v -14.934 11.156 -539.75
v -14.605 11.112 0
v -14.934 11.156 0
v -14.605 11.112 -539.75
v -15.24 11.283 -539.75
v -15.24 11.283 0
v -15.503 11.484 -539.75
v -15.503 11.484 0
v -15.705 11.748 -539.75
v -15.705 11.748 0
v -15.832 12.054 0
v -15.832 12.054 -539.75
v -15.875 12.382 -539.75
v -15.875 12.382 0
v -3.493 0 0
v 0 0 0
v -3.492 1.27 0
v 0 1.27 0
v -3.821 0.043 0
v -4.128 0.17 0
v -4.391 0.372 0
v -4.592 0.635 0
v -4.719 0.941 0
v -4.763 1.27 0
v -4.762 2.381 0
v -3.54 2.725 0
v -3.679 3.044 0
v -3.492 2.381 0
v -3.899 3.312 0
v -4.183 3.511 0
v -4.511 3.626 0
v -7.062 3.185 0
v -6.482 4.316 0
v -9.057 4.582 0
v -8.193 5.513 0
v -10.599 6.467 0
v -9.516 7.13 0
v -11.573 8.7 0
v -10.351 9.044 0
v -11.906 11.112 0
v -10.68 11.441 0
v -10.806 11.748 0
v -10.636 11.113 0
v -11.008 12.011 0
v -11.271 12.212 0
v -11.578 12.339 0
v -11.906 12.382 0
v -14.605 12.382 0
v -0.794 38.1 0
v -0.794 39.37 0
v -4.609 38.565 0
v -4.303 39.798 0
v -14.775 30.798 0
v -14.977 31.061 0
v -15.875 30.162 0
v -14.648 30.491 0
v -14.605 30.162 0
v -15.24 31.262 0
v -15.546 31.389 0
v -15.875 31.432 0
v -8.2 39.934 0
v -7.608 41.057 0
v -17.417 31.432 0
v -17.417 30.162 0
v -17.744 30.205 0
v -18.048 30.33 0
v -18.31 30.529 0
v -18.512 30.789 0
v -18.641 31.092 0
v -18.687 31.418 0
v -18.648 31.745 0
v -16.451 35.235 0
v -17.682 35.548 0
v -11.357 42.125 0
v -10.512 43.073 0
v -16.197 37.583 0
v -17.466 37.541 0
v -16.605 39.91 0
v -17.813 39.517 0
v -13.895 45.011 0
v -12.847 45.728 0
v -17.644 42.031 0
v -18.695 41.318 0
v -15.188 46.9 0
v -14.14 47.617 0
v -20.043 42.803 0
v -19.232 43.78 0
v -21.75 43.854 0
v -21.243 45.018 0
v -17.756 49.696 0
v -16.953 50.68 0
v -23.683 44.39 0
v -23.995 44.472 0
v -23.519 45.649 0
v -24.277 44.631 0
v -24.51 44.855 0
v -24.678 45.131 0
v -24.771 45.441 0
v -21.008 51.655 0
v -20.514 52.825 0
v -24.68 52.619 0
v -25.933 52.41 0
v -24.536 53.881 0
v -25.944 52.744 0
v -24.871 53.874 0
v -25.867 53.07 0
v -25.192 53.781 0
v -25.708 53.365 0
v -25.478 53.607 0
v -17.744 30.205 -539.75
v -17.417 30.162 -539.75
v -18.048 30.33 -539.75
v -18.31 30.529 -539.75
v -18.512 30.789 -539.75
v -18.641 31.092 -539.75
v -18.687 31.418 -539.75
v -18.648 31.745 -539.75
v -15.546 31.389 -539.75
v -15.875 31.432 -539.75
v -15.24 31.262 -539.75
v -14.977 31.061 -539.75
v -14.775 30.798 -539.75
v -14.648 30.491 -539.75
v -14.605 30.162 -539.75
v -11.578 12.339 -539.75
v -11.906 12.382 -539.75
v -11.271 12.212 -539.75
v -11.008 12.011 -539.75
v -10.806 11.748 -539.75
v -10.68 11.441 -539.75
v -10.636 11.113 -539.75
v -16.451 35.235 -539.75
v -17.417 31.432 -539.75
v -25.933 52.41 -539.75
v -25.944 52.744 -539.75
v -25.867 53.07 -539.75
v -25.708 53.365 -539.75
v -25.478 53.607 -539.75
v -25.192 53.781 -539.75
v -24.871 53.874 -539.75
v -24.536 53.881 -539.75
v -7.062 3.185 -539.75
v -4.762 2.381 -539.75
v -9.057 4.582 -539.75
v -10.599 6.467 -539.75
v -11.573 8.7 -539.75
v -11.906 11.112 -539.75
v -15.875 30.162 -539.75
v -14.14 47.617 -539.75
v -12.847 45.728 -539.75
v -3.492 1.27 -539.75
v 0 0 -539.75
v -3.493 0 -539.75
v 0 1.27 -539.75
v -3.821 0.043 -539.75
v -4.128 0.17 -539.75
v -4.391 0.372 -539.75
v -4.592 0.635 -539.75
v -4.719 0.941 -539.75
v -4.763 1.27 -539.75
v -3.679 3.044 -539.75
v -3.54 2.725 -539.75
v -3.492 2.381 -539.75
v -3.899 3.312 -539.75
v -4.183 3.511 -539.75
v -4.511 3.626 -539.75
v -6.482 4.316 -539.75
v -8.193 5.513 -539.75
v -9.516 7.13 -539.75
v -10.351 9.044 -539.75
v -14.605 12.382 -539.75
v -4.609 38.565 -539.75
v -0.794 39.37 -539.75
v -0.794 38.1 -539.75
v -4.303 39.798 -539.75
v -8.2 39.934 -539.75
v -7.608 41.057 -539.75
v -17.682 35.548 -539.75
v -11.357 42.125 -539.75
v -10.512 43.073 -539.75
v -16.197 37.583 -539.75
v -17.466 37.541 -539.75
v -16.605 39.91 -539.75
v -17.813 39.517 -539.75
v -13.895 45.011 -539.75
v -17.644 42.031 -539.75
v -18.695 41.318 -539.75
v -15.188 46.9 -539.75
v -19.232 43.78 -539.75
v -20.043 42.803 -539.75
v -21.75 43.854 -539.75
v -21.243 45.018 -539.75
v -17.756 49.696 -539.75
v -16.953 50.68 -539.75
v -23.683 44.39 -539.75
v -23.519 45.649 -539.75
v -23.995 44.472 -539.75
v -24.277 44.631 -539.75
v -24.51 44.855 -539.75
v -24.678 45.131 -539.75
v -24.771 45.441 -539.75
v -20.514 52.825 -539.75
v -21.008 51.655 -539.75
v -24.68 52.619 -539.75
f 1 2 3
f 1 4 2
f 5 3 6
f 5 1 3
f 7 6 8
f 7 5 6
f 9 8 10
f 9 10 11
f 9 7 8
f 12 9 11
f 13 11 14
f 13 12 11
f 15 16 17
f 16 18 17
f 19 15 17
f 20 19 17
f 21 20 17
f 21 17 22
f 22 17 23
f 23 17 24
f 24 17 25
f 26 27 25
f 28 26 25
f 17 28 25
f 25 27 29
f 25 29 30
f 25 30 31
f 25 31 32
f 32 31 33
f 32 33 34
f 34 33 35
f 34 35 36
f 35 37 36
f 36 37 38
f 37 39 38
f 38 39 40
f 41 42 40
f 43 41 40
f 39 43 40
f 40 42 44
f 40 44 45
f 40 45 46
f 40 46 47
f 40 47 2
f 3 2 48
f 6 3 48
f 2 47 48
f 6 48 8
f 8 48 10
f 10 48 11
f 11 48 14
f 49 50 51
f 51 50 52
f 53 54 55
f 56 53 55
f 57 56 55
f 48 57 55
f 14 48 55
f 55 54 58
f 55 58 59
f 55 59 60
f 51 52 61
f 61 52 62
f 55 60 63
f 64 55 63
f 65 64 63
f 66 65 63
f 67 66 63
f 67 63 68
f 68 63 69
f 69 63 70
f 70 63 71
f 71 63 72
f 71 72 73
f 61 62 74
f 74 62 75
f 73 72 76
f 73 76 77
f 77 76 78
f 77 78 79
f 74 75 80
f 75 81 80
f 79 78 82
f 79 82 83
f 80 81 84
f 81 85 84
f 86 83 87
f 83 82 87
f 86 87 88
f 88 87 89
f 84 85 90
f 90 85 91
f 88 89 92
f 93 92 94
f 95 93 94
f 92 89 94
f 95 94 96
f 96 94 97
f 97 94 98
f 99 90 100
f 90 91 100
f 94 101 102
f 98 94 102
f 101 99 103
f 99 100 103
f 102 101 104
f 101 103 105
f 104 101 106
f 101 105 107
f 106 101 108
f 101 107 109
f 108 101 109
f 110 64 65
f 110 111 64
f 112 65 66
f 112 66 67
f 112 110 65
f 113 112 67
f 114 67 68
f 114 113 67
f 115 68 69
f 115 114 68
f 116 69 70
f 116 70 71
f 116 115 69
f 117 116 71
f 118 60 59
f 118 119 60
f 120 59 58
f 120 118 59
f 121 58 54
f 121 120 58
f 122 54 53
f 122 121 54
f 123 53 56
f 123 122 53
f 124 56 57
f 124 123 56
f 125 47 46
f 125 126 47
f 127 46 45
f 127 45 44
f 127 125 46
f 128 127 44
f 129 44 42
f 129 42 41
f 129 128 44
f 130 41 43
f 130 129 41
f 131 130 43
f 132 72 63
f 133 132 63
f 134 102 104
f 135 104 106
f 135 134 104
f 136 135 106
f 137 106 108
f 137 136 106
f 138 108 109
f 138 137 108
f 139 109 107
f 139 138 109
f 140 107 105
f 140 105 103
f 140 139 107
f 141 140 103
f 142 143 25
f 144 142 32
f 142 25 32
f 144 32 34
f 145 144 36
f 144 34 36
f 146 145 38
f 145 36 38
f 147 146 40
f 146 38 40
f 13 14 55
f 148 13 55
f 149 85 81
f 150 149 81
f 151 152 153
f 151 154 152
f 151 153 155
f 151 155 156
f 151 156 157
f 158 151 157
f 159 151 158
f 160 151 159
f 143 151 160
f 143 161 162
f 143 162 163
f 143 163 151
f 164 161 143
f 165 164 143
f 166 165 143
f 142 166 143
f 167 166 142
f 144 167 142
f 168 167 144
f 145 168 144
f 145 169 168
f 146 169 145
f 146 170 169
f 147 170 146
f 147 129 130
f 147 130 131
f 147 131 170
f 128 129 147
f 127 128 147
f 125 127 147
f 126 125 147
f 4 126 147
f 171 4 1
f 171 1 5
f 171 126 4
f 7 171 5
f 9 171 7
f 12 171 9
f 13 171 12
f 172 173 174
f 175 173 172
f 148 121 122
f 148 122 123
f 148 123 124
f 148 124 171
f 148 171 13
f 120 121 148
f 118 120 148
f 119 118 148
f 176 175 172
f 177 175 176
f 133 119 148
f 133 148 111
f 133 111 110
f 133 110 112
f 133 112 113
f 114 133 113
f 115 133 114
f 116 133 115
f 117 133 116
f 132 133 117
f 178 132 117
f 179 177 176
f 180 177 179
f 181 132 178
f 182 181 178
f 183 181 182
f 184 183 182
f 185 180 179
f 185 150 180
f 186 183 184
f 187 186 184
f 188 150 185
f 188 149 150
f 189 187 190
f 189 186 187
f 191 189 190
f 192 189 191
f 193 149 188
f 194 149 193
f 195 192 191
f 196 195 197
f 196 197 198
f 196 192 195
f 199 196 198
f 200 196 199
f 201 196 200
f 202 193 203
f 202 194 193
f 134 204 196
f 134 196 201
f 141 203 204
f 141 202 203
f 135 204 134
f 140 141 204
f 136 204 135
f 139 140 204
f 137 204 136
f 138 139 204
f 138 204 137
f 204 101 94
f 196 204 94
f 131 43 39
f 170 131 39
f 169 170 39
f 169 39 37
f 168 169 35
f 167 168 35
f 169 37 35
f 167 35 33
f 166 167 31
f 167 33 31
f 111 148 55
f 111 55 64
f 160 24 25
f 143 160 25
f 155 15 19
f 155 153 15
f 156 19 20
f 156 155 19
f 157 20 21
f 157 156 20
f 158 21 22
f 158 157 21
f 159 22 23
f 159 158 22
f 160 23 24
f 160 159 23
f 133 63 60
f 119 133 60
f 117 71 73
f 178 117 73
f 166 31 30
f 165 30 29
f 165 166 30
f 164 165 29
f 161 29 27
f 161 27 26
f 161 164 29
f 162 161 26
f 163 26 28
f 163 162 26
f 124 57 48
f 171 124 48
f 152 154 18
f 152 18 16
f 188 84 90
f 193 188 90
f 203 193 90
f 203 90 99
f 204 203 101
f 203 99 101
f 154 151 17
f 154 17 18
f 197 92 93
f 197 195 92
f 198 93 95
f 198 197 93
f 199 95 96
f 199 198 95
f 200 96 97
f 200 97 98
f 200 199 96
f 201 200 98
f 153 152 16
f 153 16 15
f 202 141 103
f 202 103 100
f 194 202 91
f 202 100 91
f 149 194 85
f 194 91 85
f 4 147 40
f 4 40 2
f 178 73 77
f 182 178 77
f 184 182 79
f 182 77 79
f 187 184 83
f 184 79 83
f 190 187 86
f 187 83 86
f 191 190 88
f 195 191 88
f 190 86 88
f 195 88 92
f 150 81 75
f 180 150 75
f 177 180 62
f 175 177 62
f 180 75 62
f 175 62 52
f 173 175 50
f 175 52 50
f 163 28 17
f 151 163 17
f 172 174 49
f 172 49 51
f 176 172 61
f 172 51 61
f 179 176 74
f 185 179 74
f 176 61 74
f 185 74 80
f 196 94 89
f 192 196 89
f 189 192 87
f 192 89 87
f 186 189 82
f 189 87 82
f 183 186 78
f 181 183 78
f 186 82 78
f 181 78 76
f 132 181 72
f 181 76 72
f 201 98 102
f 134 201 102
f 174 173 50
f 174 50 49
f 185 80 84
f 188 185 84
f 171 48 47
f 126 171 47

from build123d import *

# Parameters (mm, degrees)
EXTRUDE_THIN1_DEPTH = 539.75
FILLET1_R           = 1.27


with BuildPart() as part:
    # Sketch1 → Extrude-Thin1 (new body)
    with BuildSketch(Plane.XY):
        with BuildLine():
            Line((0, 0), (-4.7625, 0))
            Line((-4.7625, 0), (-4.7625, 2.38125))
            ThreePointArc((-4.7625, 2.38125), (-9.892743248, 5.471846434), (-11.90625, 11.1125))
            Line((-11.90625, 11.1125), (-15.875, 11.1125))
            Line((-15.875, 11.1125), (-15.875, 30.1625))
            Line((-15.875, 30.1625), (-19.05, 30.1625))
            Line((-19.05, 30.1625), (-17.682307692, 35.547788462))
            ThreePointArc((-17.682307692, 35.547788462), (-18.967315097, 41.692088258), (-24.60625, 44.45))
            Line((-24.60625, 44.45), (-26.19375, 53.975))
            ThreePointArc((-26.19375, 53.975), (-19.37999398, 52.288155979), (-14.140184362, 47.617277151))
            Line((-14.140184362, 47.617277151), (-12.847315638, 45.727722849))
            ThreePointArc((-12.847315638, 45.727722849), (-7.60750602, 41.056844021), (-0.79375, 39.37))
            Line((-0.79375, 39.37), (-0.79375, 38.1))
            ThreePointArc((-0.79375, 38.1), (-8.200006544, 39.93352611), (-13.89545178, 45.010568314))
            Line((-13.89545178, 45.010568314), (-15.188320504, 46.900122616))
            ThreePointArc((-15.188320504, 46.900122616), (-19.312101481, 50.792133717), (-24.680202995, 52.618826381))
            Line((-24.680202995, 52.618826381), (-23.518633198, 45.649407601))
            ThreePointArc((-23.518633198, 45.649407601), (-17.64421442, 42.030786976), (-16.451384615, 35.235173077))
            Line((-16.451384615, 35.235173077), (-17.417142857, 31.4325))
            Line((-17.417142857, 31.4325), (-14.605, 31.4325))
            Line((-14.605, 31.4325), (-14.605, 12.3825))
            Line((-14.605, 12.3825), (-10.529920944, 12.3825))
            ThreePointArc((-10.529920944, 12.3825), (-8.987461499, 6.372542318), (-3.4925, 3.490846534))
            Line((-3.4925, 3.490846534), (-3.4925, 1.27))
            Line((-3.4925, 1.27), (0, 1.27))
            Line((0, 1.27), (0, 0))
        make_face()
    extrude(amount=-EXTRUDE_THIN1_DEPTH)

    # Fillet1
    fillet1_edges = [part.edges().sort_by_distance(p)[0] for p in [
        (-14.605, 31.4325, -269.875),
        (-10.529920944, 12.3825, -269.875),
        (-3.4925, 3.490846534, -269.875),
        (-4.7625, 0, -269.875),
        (-15.875, 11.1125, -269.875),
        (-19.05, 30.1625, -269.875),
        (-24.60625, 44.45, -269.875),
        (-26.19375, 53.975, -269.875),
    ]]
    fillet(fillet1_edges, radius=FILLET1_R)


solid = part.part
